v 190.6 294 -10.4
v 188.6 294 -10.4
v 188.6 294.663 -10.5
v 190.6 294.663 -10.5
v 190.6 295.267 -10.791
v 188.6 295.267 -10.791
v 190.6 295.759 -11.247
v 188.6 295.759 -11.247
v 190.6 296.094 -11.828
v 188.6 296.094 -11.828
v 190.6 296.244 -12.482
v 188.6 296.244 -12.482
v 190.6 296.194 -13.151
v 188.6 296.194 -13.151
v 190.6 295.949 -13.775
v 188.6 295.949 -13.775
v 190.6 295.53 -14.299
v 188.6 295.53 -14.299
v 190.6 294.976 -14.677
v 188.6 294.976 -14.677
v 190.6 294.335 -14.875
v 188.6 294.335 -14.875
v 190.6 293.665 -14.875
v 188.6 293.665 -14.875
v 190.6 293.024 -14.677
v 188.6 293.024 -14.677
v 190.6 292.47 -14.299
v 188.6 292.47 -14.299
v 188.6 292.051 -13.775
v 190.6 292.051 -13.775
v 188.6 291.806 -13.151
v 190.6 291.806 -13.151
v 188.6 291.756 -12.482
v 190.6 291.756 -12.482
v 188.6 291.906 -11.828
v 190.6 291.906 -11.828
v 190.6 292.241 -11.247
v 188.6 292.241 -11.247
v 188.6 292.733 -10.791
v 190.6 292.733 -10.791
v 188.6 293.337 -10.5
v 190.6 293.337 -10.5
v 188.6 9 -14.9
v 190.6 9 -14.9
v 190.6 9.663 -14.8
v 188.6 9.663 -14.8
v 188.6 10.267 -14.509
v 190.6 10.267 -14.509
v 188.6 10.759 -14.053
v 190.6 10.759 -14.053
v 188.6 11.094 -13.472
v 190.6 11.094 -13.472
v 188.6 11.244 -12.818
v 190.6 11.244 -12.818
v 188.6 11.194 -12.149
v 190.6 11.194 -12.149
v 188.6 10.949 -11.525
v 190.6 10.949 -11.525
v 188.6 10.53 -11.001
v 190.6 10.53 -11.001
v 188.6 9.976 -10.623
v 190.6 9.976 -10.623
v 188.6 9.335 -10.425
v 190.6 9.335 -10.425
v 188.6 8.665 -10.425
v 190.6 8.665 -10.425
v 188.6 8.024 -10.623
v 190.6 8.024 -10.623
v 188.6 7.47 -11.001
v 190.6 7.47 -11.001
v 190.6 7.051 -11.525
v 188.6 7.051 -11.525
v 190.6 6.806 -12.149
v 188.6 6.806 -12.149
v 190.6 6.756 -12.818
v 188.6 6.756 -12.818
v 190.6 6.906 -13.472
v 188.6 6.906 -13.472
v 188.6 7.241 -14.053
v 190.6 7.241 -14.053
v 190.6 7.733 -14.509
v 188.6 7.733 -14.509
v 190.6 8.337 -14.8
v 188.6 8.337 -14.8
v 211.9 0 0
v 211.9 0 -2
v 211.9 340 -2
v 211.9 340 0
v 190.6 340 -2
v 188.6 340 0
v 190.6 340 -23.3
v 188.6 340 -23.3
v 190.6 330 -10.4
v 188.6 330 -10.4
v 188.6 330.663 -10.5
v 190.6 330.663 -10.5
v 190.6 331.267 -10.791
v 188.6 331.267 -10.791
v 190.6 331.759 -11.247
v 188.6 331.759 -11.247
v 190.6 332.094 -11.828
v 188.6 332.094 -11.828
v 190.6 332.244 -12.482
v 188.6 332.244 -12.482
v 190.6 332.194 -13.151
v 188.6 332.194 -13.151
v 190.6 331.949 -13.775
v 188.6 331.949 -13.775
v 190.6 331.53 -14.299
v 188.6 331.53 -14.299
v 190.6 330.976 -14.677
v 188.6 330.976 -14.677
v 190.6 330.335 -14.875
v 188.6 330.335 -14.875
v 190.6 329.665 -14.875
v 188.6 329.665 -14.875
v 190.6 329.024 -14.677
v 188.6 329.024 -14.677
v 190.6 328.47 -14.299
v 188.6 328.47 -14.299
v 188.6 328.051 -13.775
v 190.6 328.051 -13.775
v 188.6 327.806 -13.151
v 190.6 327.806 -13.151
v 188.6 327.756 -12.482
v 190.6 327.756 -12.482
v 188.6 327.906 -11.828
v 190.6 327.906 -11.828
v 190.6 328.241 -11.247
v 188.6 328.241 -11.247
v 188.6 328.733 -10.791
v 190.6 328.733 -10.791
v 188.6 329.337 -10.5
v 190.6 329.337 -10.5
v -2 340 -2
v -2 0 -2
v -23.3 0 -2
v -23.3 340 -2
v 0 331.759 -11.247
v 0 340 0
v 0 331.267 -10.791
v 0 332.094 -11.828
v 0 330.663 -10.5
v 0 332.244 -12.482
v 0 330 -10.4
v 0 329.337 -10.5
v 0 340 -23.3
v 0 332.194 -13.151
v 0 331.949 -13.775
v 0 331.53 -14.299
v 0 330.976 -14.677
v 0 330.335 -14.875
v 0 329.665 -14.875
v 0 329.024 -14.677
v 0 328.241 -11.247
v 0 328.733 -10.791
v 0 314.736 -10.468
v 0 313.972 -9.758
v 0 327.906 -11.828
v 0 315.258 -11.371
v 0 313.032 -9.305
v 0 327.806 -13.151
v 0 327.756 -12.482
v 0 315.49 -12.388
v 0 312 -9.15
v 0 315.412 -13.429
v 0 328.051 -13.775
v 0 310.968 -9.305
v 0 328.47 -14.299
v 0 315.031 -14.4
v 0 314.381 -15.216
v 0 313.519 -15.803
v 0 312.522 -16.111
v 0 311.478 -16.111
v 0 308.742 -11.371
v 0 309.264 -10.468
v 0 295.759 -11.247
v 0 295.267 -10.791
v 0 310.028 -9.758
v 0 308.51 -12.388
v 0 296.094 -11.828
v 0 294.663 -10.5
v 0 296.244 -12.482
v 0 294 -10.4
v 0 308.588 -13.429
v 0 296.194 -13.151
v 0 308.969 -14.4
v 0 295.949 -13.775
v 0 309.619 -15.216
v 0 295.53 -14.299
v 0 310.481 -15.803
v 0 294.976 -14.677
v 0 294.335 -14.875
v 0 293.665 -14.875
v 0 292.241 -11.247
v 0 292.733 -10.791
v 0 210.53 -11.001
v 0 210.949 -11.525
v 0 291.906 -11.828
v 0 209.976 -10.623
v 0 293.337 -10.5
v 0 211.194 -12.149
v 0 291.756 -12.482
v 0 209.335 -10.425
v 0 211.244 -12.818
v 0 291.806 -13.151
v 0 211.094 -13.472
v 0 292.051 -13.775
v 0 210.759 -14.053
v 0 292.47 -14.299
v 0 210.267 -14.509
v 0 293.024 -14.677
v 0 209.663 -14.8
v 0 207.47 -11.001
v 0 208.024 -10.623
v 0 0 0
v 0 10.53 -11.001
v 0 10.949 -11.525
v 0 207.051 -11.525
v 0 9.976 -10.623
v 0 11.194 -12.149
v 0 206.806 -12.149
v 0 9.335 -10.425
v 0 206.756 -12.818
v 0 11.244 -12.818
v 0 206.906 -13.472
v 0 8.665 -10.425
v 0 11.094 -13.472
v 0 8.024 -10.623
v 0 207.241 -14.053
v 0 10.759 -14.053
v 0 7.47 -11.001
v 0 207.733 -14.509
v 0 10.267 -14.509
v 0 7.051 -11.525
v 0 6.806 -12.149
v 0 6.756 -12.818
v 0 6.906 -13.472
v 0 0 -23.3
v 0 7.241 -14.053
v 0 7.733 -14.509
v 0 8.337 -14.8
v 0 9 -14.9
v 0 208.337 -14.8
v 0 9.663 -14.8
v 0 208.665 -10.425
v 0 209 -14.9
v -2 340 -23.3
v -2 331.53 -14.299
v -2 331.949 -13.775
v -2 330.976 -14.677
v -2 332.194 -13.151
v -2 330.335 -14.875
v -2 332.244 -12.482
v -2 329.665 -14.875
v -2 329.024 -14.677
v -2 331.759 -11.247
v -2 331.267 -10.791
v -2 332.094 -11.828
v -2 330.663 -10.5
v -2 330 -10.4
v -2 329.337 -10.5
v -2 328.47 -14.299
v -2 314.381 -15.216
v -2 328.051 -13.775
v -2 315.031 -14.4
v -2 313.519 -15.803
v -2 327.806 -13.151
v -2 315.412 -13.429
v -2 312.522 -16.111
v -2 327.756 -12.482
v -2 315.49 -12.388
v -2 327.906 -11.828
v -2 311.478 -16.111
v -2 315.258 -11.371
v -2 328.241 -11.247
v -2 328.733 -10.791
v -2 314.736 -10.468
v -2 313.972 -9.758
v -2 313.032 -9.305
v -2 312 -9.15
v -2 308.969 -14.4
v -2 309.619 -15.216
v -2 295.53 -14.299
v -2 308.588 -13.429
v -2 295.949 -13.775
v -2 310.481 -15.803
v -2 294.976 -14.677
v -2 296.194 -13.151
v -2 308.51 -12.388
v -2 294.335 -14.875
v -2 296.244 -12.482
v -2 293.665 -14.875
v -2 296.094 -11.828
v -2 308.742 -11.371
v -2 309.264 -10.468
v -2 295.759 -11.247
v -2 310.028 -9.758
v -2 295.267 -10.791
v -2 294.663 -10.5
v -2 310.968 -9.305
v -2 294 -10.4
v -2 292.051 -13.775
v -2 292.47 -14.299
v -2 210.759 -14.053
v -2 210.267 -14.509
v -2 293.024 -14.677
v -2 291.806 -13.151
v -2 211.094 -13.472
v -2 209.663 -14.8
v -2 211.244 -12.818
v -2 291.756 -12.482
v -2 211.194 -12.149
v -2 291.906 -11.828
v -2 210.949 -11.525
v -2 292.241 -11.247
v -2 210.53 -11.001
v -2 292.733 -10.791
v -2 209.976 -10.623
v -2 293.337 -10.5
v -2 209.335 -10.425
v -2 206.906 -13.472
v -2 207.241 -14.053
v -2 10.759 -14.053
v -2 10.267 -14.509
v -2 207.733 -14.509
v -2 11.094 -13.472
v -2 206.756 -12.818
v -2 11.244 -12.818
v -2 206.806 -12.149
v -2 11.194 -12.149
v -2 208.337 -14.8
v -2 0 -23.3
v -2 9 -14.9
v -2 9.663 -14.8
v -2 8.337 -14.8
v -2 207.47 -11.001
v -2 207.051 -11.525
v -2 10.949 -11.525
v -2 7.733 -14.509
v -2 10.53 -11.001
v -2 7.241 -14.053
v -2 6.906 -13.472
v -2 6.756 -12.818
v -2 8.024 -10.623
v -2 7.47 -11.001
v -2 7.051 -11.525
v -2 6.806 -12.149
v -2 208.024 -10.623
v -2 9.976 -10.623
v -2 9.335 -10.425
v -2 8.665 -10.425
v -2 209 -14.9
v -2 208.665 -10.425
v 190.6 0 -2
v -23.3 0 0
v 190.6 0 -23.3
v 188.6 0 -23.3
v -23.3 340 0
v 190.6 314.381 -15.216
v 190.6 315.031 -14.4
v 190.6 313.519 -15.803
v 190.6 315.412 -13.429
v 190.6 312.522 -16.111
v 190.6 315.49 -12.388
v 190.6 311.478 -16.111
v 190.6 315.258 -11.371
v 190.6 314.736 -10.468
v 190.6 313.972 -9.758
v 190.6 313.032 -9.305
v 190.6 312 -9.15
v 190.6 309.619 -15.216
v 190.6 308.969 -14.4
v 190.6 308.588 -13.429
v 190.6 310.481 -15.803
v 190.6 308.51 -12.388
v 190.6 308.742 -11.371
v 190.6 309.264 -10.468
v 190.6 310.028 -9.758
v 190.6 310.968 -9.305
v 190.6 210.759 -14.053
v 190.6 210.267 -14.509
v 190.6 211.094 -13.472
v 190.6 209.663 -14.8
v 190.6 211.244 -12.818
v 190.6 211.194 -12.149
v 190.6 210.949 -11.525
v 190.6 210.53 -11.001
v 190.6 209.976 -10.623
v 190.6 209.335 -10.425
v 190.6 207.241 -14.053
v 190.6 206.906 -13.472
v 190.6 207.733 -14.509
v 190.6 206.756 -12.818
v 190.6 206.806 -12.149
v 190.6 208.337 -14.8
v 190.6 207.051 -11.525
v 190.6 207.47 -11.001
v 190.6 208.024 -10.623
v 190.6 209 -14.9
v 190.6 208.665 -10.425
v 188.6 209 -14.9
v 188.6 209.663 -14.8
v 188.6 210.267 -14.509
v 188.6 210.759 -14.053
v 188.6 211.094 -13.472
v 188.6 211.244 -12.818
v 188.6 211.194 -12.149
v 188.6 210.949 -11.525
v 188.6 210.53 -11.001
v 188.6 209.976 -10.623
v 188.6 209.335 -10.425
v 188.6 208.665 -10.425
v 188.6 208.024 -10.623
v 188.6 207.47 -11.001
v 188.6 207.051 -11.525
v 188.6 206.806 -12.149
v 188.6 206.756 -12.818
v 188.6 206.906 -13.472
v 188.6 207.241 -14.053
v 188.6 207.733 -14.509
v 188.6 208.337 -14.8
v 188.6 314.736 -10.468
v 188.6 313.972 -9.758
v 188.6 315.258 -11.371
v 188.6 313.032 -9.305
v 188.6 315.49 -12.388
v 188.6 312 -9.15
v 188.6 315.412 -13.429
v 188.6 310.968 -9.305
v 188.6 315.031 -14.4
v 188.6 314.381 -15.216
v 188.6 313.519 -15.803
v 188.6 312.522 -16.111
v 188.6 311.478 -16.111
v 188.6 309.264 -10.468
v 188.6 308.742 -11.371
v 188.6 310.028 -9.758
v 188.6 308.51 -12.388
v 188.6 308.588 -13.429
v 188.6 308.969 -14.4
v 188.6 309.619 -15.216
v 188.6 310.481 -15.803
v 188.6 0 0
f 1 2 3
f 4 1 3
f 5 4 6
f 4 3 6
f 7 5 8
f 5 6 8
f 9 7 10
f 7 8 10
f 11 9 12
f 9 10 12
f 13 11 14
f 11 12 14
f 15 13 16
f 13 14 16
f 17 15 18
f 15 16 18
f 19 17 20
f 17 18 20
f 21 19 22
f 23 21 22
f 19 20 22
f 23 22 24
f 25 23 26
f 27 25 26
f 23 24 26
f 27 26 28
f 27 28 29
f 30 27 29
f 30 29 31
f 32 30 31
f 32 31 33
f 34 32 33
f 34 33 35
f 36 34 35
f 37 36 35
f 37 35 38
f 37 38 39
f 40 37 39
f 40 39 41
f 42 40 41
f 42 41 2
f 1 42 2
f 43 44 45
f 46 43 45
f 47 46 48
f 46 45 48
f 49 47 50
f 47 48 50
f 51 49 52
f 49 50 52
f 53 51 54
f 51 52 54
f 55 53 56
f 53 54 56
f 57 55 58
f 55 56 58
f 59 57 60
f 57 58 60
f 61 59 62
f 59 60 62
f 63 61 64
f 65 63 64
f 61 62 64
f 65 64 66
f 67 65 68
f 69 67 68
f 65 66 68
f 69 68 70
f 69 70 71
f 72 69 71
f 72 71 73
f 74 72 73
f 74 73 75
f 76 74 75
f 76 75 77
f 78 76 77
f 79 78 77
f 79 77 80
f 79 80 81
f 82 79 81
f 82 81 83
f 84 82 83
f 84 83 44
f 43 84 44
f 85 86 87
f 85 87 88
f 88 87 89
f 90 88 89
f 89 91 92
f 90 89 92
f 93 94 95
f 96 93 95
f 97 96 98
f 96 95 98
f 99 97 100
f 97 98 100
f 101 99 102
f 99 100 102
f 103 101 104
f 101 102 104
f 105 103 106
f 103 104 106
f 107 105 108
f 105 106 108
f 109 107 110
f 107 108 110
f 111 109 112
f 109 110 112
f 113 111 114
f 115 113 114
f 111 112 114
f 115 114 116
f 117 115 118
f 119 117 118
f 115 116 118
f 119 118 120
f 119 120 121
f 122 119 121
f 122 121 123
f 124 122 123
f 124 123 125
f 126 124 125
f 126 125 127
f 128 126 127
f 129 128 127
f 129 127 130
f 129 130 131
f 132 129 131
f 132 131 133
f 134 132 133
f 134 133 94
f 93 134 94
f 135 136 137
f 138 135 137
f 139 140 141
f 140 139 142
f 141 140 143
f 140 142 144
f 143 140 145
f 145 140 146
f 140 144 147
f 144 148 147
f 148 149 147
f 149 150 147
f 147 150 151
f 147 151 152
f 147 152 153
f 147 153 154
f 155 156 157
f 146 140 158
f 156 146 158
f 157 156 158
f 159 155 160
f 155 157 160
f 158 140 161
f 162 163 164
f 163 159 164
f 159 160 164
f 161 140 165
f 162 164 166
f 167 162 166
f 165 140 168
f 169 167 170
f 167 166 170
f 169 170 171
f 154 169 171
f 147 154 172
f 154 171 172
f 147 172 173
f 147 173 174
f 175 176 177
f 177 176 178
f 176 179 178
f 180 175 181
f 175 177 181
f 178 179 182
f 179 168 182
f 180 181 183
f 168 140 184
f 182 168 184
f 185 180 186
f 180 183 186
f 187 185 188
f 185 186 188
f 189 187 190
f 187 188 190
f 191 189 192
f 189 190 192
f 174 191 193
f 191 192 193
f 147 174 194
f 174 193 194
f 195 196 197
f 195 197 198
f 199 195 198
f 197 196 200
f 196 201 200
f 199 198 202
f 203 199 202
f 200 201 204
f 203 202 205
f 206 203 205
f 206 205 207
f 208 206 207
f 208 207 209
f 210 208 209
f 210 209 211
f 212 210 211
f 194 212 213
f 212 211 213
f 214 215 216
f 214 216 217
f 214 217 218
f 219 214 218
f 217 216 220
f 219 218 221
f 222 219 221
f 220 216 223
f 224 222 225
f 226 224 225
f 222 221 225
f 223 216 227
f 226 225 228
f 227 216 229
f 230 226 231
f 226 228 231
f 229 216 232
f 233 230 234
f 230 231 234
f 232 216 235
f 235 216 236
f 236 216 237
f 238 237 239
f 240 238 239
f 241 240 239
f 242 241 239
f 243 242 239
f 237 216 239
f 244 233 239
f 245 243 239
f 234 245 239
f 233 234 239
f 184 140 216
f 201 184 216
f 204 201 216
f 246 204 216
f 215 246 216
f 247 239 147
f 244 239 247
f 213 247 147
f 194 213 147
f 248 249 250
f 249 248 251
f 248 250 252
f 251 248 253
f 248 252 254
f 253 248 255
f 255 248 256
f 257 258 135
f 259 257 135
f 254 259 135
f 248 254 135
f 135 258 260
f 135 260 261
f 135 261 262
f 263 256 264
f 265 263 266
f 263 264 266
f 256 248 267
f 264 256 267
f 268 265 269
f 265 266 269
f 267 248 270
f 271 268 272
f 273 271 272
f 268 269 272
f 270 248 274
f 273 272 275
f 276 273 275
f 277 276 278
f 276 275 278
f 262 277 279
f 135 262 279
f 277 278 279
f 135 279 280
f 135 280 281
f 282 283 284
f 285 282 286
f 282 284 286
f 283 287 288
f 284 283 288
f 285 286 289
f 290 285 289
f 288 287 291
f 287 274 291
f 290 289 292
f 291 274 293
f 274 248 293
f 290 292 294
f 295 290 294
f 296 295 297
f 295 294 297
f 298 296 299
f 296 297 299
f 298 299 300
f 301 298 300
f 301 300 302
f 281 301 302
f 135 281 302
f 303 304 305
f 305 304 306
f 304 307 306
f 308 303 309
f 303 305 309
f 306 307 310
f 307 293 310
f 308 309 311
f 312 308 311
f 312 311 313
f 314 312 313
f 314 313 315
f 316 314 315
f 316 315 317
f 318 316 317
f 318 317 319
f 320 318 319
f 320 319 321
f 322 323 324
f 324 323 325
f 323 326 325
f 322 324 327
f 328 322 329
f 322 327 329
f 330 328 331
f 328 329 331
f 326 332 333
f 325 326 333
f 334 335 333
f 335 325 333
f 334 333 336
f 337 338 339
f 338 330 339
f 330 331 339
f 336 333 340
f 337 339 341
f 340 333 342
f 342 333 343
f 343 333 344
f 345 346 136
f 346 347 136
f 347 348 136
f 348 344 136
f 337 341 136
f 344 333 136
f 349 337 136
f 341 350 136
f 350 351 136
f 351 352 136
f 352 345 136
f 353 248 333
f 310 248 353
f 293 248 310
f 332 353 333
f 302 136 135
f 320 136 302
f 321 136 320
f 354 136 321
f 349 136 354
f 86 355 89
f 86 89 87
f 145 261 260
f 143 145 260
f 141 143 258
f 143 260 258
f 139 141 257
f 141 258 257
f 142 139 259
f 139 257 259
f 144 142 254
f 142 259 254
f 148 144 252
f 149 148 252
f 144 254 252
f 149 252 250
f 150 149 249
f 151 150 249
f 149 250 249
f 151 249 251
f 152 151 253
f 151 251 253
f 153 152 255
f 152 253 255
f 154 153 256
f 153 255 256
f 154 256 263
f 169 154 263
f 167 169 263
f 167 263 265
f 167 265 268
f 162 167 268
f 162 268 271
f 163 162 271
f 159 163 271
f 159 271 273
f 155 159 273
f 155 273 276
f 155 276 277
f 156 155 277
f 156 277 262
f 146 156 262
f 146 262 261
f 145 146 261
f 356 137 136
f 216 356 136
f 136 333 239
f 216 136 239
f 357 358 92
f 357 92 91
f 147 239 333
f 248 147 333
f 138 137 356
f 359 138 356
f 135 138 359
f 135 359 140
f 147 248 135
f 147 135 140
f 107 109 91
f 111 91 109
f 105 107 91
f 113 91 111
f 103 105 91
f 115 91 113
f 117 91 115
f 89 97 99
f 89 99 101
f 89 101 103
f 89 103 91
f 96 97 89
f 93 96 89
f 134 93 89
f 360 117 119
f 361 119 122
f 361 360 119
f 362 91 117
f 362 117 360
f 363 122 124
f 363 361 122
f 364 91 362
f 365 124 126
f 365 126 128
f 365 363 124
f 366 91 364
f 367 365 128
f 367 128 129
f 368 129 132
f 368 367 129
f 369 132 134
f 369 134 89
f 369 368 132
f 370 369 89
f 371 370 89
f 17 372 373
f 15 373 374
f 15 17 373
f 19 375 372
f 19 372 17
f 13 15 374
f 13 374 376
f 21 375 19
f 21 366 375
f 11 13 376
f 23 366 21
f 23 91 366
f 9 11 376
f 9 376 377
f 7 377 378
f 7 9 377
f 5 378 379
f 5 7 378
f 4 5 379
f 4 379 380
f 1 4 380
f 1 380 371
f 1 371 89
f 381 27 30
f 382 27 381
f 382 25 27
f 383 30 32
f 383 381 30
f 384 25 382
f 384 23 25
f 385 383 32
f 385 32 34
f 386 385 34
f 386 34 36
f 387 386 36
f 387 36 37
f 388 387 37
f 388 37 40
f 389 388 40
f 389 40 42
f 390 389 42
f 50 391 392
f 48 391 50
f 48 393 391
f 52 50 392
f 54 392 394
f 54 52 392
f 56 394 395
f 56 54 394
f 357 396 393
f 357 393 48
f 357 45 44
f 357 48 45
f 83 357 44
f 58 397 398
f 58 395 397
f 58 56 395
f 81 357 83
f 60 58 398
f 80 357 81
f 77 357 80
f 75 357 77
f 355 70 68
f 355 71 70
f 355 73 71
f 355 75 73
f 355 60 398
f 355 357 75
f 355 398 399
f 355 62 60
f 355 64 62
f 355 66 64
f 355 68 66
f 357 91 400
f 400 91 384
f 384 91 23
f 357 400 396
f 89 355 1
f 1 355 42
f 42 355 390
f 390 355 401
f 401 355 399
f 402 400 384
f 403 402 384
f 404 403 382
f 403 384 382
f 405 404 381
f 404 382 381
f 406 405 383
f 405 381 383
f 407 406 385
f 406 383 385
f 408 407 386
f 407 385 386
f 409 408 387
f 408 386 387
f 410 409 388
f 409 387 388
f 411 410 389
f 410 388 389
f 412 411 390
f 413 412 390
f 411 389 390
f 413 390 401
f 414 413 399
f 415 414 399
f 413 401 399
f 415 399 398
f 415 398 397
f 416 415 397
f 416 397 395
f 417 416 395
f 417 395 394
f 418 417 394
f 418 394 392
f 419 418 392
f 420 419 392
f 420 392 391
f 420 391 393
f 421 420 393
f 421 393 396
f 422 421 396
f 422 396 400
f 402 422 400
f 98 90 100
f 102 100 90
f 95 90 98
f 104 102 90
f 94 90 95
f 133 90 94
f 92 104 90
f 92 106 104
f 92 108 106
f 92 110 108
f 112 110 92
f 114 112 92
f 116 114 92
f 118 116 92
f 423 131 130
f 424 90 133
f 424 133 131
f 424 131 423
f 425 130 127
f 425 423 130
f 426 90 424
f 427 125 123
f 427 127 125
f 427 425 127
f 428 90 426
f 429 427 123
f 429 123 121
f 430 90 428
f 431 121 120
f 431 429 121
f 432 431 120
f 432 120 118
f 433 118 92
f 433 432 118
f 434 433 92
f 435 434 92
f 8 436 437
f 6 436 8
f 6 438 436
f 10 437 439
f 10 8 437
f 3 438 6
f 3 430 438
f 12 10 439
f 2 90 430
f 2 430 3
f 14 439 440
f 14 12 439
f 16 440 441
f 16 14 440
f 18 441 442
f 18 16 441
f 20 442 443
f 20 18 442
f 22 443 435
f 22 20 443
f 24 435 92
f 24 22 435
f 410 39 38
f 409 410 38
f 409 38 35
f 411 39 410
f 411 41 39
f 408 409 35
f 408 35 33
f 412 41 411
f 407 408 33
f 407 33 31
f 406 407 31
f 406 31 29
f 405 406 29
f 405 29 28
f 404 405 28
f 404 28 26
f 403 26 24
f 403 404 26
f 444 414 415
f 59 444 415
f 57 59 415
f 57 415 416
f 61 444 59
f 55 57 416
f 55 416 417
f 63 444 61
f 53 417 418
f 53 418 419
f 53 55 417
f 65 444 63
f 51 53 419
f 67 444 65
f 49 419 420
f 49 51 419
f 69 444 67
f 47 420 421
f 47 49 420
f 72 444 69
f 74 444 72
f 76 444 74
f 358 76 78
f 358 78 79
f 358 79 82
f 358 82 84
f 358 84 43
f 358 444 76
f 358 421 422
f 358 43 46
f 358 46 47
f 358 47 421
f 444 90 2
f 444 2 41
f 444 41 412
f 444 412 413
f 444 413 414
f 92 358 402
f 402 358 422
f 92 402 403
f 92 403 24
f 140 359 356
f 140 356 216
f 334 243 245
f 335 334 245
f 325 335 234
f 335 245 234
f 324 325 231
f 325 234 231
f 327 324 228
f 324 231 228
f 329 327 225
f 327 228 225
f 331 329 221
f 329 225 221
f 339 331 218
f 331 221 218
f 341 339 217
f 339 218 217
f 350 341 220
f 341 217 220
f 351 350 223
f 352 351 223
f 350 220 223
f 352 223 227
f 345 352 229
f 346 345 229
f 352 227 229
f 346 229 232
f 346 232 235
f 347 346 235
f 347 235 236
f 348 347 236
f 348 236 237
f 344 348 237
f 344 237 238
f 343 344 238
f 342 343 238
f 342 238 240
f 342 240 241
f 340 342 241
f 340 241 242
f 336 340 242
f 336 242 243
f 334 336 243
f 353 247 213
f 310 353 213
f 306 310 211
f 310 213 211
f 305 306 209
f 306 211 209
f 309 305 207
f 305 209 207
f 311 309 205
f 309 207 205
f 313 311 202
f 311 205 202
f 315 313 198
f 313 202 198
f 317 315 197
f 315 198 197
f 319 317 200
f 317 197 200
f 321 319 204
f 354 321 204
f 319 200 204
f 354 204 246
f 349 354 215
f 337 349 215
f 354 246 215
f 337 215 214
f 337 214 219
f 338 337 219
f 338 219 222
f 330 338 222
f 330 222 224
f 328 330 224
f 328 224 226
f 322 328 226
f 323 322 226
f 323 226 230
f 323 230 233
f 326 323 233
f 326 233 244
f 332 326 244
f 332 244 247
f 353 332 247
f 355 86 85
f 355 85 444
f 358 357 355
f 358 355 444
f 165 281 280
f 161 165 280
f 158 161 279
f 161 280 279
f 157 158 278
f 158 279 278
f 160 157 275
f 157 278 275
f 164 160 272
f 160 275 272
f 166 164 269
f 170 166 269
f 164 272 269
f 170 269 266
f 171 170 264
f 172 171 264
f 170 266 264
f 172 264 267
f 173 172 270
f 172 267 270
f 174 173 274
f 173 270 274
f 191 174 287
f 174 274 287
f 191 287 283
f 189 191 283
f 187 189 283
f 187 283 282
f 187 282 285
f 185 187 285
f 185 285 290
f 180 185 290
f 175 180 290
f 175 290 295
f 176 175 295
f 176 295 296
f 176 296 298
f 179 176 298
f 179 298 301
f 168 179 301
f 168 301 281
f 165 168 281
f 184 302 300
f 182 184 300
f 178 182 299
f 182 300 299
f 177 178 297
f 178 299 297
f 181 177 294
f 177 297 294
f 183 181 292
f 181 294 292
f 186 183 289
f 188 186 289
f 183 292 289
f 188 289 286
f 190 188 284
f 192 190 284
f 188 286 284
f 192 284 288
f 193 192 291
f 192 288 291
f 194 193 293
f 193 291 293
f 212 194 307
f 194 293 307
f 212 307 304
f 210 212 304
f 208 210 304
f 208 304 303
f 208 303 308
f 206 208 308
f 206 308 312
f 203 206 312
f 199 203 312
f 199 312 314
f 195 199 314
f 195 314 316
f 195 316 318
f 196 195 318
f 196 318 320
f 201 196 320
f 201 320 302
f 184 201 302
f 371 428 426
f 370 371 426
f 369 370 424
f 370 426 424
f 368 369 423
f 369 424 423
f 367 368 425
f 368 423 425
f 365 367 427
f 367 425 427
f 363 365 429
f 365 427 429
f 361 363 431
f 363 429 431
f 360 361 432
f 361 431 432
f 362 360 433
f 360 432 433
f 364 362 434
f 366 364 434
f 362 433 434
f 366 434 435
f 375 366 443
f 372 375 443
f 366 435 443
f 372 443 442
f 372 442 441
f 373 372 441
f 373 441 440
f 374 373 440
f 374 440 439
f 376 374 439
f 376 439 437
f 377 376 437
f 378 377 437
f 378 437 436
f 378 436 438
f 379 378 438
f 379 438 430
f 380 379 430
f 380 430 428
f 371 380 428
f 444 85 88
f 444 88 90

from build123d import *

# Parameters (mm, degrees)
BOSS_EXTRUDE1_DEPTH   = 340
BOSS_EXTRUDE1_2_DEPTH = 340
SKETCH2_R             = 2.25
CUT_EXTRUDE1_DEPTH    = 215
SKETCH3_R             = 2.25
CUT_EXTRUDE2_DEPTH    = 215
SKETCH4_R             = 2.25
SKETCH4_R_2           = 3.5
CUT_EXTRUDE3_DEPTH    = 199


with BuildPart() as part:
    # Sketch1 → Boss-Extrude1 (new body)
    with BuildSketch(Plane(origin=(0, 0, 0), x_dir=(1, 0, 0), z_dir=(0, 1, 0))):
        Polygon((188.6, 0), (188.6, 23.3), (190.6, 23.3), (190.6, 2), (211.9, 2), (211.9, 0), align=None)
    extrude(amount=BOSS_EXTRUDE1_DEPTH)


with BuildPart() as body_2:
    # Sketch1 → Boss-Extrude1 2 (new body)
    with BuildSketch(Plane(origin=(0, 0, 0), x_dir=(1, 0, 0), z_dir=(0, 1, 0))):
        Polygon((-23.3, 2), (-23.3, 0), (0, 0), (0, 23.3), (-2, 23.3), (-2, 2), align=None)
    extrude(amount=BOSS_EXTRUDE1_2_DEPTH)


with BuildPart() as cut_extrude1_tool:
    # Sketch2 → Cut-Extrude1 (new body)
    with BuildSketch(Plane(origin=(190.6, 0, 0), x_dir=(0, 0, -1), z_dir=(1, 0, 0))):
        with Locations((12.65, 9)):
            Circle(SKETCH2_R)
    extrude(amount=-CUT_EXTRUDE1_DEPTH)


with BuildPart() as part_1:
    add(part.part)

    # Cut-Extrude1: cut by cut_extrude1_tool
    add(cut_extrude1_tool.part, mode=Mode.SUBTRACT)


with BuildPart() as body_2_1:
    add(body_2.part)

    # Cut-Extrude1: cut by cut_extrude1_tool
    add(cut_extrude1_tool.part, mode=Mode.SUBTRACT)


with BuildPart() as cut_extrude2_tool:
    # Sketch3 → Cut-Extrude2 (new body)
    with BuildSketch(Plane(origin=(190.6, 0, 0), x_dir=(0, 0, -1), z_dir=(1, 0, 0))):
        with Locations((12.65, 209)):
            Circle(SKETCH3_R)
    extrude(amount=-CUT_EXTRUDE2_DEPTH)


with BuildPart() as part_2:
    add(part_1.part)

    # Cut-Extrude2: cut by cut_extrude2_tool
    add(cut_extrude2_tool.part, mode=Mode.SUBTRACT)


with BuildPart() as body_2_2:
    add(body_2_1.part)

    # Cut-Extrude2: cut by cut_extrude2_tool
    add(cut_extrude2_tool.part, mode=Mode.SUBTRACT)


with BuildPart() as cut_extrude3_tool:
    # Sketch4 → Cut-Extrude3 (new body)
    with BuildSketch(Plane.ZY.offset(2)):
        with Locations((-12.65, 330)):
            Circle(SKETCH4_R)
        with Locations((-12.65, 294)):
            Circle(SKETCH4_R)
        with Locations((-12.65, 312)):
            Circle(SKETCH4_R_2)
    extrude(amount=-CUT_EXTRUDE3_DEPTH)


with BuildPart() as part_3:
    add(part_2.part)

    # Cut-Extrude3: cut by cut_extrude3_tool
    add(cut_extrude3_tool.part, mode=Mode.SUBTRACT)


with BuildPart() as body_2_3:
    add(body_2_2.part)

    # Cut-Extrude3: cut by cut_extrude3_tool
    add(cut_extrude3_tool.part, mode=Mode.SUBTRACT)


solid = Compound([part_3.part, body_2_3.part])
